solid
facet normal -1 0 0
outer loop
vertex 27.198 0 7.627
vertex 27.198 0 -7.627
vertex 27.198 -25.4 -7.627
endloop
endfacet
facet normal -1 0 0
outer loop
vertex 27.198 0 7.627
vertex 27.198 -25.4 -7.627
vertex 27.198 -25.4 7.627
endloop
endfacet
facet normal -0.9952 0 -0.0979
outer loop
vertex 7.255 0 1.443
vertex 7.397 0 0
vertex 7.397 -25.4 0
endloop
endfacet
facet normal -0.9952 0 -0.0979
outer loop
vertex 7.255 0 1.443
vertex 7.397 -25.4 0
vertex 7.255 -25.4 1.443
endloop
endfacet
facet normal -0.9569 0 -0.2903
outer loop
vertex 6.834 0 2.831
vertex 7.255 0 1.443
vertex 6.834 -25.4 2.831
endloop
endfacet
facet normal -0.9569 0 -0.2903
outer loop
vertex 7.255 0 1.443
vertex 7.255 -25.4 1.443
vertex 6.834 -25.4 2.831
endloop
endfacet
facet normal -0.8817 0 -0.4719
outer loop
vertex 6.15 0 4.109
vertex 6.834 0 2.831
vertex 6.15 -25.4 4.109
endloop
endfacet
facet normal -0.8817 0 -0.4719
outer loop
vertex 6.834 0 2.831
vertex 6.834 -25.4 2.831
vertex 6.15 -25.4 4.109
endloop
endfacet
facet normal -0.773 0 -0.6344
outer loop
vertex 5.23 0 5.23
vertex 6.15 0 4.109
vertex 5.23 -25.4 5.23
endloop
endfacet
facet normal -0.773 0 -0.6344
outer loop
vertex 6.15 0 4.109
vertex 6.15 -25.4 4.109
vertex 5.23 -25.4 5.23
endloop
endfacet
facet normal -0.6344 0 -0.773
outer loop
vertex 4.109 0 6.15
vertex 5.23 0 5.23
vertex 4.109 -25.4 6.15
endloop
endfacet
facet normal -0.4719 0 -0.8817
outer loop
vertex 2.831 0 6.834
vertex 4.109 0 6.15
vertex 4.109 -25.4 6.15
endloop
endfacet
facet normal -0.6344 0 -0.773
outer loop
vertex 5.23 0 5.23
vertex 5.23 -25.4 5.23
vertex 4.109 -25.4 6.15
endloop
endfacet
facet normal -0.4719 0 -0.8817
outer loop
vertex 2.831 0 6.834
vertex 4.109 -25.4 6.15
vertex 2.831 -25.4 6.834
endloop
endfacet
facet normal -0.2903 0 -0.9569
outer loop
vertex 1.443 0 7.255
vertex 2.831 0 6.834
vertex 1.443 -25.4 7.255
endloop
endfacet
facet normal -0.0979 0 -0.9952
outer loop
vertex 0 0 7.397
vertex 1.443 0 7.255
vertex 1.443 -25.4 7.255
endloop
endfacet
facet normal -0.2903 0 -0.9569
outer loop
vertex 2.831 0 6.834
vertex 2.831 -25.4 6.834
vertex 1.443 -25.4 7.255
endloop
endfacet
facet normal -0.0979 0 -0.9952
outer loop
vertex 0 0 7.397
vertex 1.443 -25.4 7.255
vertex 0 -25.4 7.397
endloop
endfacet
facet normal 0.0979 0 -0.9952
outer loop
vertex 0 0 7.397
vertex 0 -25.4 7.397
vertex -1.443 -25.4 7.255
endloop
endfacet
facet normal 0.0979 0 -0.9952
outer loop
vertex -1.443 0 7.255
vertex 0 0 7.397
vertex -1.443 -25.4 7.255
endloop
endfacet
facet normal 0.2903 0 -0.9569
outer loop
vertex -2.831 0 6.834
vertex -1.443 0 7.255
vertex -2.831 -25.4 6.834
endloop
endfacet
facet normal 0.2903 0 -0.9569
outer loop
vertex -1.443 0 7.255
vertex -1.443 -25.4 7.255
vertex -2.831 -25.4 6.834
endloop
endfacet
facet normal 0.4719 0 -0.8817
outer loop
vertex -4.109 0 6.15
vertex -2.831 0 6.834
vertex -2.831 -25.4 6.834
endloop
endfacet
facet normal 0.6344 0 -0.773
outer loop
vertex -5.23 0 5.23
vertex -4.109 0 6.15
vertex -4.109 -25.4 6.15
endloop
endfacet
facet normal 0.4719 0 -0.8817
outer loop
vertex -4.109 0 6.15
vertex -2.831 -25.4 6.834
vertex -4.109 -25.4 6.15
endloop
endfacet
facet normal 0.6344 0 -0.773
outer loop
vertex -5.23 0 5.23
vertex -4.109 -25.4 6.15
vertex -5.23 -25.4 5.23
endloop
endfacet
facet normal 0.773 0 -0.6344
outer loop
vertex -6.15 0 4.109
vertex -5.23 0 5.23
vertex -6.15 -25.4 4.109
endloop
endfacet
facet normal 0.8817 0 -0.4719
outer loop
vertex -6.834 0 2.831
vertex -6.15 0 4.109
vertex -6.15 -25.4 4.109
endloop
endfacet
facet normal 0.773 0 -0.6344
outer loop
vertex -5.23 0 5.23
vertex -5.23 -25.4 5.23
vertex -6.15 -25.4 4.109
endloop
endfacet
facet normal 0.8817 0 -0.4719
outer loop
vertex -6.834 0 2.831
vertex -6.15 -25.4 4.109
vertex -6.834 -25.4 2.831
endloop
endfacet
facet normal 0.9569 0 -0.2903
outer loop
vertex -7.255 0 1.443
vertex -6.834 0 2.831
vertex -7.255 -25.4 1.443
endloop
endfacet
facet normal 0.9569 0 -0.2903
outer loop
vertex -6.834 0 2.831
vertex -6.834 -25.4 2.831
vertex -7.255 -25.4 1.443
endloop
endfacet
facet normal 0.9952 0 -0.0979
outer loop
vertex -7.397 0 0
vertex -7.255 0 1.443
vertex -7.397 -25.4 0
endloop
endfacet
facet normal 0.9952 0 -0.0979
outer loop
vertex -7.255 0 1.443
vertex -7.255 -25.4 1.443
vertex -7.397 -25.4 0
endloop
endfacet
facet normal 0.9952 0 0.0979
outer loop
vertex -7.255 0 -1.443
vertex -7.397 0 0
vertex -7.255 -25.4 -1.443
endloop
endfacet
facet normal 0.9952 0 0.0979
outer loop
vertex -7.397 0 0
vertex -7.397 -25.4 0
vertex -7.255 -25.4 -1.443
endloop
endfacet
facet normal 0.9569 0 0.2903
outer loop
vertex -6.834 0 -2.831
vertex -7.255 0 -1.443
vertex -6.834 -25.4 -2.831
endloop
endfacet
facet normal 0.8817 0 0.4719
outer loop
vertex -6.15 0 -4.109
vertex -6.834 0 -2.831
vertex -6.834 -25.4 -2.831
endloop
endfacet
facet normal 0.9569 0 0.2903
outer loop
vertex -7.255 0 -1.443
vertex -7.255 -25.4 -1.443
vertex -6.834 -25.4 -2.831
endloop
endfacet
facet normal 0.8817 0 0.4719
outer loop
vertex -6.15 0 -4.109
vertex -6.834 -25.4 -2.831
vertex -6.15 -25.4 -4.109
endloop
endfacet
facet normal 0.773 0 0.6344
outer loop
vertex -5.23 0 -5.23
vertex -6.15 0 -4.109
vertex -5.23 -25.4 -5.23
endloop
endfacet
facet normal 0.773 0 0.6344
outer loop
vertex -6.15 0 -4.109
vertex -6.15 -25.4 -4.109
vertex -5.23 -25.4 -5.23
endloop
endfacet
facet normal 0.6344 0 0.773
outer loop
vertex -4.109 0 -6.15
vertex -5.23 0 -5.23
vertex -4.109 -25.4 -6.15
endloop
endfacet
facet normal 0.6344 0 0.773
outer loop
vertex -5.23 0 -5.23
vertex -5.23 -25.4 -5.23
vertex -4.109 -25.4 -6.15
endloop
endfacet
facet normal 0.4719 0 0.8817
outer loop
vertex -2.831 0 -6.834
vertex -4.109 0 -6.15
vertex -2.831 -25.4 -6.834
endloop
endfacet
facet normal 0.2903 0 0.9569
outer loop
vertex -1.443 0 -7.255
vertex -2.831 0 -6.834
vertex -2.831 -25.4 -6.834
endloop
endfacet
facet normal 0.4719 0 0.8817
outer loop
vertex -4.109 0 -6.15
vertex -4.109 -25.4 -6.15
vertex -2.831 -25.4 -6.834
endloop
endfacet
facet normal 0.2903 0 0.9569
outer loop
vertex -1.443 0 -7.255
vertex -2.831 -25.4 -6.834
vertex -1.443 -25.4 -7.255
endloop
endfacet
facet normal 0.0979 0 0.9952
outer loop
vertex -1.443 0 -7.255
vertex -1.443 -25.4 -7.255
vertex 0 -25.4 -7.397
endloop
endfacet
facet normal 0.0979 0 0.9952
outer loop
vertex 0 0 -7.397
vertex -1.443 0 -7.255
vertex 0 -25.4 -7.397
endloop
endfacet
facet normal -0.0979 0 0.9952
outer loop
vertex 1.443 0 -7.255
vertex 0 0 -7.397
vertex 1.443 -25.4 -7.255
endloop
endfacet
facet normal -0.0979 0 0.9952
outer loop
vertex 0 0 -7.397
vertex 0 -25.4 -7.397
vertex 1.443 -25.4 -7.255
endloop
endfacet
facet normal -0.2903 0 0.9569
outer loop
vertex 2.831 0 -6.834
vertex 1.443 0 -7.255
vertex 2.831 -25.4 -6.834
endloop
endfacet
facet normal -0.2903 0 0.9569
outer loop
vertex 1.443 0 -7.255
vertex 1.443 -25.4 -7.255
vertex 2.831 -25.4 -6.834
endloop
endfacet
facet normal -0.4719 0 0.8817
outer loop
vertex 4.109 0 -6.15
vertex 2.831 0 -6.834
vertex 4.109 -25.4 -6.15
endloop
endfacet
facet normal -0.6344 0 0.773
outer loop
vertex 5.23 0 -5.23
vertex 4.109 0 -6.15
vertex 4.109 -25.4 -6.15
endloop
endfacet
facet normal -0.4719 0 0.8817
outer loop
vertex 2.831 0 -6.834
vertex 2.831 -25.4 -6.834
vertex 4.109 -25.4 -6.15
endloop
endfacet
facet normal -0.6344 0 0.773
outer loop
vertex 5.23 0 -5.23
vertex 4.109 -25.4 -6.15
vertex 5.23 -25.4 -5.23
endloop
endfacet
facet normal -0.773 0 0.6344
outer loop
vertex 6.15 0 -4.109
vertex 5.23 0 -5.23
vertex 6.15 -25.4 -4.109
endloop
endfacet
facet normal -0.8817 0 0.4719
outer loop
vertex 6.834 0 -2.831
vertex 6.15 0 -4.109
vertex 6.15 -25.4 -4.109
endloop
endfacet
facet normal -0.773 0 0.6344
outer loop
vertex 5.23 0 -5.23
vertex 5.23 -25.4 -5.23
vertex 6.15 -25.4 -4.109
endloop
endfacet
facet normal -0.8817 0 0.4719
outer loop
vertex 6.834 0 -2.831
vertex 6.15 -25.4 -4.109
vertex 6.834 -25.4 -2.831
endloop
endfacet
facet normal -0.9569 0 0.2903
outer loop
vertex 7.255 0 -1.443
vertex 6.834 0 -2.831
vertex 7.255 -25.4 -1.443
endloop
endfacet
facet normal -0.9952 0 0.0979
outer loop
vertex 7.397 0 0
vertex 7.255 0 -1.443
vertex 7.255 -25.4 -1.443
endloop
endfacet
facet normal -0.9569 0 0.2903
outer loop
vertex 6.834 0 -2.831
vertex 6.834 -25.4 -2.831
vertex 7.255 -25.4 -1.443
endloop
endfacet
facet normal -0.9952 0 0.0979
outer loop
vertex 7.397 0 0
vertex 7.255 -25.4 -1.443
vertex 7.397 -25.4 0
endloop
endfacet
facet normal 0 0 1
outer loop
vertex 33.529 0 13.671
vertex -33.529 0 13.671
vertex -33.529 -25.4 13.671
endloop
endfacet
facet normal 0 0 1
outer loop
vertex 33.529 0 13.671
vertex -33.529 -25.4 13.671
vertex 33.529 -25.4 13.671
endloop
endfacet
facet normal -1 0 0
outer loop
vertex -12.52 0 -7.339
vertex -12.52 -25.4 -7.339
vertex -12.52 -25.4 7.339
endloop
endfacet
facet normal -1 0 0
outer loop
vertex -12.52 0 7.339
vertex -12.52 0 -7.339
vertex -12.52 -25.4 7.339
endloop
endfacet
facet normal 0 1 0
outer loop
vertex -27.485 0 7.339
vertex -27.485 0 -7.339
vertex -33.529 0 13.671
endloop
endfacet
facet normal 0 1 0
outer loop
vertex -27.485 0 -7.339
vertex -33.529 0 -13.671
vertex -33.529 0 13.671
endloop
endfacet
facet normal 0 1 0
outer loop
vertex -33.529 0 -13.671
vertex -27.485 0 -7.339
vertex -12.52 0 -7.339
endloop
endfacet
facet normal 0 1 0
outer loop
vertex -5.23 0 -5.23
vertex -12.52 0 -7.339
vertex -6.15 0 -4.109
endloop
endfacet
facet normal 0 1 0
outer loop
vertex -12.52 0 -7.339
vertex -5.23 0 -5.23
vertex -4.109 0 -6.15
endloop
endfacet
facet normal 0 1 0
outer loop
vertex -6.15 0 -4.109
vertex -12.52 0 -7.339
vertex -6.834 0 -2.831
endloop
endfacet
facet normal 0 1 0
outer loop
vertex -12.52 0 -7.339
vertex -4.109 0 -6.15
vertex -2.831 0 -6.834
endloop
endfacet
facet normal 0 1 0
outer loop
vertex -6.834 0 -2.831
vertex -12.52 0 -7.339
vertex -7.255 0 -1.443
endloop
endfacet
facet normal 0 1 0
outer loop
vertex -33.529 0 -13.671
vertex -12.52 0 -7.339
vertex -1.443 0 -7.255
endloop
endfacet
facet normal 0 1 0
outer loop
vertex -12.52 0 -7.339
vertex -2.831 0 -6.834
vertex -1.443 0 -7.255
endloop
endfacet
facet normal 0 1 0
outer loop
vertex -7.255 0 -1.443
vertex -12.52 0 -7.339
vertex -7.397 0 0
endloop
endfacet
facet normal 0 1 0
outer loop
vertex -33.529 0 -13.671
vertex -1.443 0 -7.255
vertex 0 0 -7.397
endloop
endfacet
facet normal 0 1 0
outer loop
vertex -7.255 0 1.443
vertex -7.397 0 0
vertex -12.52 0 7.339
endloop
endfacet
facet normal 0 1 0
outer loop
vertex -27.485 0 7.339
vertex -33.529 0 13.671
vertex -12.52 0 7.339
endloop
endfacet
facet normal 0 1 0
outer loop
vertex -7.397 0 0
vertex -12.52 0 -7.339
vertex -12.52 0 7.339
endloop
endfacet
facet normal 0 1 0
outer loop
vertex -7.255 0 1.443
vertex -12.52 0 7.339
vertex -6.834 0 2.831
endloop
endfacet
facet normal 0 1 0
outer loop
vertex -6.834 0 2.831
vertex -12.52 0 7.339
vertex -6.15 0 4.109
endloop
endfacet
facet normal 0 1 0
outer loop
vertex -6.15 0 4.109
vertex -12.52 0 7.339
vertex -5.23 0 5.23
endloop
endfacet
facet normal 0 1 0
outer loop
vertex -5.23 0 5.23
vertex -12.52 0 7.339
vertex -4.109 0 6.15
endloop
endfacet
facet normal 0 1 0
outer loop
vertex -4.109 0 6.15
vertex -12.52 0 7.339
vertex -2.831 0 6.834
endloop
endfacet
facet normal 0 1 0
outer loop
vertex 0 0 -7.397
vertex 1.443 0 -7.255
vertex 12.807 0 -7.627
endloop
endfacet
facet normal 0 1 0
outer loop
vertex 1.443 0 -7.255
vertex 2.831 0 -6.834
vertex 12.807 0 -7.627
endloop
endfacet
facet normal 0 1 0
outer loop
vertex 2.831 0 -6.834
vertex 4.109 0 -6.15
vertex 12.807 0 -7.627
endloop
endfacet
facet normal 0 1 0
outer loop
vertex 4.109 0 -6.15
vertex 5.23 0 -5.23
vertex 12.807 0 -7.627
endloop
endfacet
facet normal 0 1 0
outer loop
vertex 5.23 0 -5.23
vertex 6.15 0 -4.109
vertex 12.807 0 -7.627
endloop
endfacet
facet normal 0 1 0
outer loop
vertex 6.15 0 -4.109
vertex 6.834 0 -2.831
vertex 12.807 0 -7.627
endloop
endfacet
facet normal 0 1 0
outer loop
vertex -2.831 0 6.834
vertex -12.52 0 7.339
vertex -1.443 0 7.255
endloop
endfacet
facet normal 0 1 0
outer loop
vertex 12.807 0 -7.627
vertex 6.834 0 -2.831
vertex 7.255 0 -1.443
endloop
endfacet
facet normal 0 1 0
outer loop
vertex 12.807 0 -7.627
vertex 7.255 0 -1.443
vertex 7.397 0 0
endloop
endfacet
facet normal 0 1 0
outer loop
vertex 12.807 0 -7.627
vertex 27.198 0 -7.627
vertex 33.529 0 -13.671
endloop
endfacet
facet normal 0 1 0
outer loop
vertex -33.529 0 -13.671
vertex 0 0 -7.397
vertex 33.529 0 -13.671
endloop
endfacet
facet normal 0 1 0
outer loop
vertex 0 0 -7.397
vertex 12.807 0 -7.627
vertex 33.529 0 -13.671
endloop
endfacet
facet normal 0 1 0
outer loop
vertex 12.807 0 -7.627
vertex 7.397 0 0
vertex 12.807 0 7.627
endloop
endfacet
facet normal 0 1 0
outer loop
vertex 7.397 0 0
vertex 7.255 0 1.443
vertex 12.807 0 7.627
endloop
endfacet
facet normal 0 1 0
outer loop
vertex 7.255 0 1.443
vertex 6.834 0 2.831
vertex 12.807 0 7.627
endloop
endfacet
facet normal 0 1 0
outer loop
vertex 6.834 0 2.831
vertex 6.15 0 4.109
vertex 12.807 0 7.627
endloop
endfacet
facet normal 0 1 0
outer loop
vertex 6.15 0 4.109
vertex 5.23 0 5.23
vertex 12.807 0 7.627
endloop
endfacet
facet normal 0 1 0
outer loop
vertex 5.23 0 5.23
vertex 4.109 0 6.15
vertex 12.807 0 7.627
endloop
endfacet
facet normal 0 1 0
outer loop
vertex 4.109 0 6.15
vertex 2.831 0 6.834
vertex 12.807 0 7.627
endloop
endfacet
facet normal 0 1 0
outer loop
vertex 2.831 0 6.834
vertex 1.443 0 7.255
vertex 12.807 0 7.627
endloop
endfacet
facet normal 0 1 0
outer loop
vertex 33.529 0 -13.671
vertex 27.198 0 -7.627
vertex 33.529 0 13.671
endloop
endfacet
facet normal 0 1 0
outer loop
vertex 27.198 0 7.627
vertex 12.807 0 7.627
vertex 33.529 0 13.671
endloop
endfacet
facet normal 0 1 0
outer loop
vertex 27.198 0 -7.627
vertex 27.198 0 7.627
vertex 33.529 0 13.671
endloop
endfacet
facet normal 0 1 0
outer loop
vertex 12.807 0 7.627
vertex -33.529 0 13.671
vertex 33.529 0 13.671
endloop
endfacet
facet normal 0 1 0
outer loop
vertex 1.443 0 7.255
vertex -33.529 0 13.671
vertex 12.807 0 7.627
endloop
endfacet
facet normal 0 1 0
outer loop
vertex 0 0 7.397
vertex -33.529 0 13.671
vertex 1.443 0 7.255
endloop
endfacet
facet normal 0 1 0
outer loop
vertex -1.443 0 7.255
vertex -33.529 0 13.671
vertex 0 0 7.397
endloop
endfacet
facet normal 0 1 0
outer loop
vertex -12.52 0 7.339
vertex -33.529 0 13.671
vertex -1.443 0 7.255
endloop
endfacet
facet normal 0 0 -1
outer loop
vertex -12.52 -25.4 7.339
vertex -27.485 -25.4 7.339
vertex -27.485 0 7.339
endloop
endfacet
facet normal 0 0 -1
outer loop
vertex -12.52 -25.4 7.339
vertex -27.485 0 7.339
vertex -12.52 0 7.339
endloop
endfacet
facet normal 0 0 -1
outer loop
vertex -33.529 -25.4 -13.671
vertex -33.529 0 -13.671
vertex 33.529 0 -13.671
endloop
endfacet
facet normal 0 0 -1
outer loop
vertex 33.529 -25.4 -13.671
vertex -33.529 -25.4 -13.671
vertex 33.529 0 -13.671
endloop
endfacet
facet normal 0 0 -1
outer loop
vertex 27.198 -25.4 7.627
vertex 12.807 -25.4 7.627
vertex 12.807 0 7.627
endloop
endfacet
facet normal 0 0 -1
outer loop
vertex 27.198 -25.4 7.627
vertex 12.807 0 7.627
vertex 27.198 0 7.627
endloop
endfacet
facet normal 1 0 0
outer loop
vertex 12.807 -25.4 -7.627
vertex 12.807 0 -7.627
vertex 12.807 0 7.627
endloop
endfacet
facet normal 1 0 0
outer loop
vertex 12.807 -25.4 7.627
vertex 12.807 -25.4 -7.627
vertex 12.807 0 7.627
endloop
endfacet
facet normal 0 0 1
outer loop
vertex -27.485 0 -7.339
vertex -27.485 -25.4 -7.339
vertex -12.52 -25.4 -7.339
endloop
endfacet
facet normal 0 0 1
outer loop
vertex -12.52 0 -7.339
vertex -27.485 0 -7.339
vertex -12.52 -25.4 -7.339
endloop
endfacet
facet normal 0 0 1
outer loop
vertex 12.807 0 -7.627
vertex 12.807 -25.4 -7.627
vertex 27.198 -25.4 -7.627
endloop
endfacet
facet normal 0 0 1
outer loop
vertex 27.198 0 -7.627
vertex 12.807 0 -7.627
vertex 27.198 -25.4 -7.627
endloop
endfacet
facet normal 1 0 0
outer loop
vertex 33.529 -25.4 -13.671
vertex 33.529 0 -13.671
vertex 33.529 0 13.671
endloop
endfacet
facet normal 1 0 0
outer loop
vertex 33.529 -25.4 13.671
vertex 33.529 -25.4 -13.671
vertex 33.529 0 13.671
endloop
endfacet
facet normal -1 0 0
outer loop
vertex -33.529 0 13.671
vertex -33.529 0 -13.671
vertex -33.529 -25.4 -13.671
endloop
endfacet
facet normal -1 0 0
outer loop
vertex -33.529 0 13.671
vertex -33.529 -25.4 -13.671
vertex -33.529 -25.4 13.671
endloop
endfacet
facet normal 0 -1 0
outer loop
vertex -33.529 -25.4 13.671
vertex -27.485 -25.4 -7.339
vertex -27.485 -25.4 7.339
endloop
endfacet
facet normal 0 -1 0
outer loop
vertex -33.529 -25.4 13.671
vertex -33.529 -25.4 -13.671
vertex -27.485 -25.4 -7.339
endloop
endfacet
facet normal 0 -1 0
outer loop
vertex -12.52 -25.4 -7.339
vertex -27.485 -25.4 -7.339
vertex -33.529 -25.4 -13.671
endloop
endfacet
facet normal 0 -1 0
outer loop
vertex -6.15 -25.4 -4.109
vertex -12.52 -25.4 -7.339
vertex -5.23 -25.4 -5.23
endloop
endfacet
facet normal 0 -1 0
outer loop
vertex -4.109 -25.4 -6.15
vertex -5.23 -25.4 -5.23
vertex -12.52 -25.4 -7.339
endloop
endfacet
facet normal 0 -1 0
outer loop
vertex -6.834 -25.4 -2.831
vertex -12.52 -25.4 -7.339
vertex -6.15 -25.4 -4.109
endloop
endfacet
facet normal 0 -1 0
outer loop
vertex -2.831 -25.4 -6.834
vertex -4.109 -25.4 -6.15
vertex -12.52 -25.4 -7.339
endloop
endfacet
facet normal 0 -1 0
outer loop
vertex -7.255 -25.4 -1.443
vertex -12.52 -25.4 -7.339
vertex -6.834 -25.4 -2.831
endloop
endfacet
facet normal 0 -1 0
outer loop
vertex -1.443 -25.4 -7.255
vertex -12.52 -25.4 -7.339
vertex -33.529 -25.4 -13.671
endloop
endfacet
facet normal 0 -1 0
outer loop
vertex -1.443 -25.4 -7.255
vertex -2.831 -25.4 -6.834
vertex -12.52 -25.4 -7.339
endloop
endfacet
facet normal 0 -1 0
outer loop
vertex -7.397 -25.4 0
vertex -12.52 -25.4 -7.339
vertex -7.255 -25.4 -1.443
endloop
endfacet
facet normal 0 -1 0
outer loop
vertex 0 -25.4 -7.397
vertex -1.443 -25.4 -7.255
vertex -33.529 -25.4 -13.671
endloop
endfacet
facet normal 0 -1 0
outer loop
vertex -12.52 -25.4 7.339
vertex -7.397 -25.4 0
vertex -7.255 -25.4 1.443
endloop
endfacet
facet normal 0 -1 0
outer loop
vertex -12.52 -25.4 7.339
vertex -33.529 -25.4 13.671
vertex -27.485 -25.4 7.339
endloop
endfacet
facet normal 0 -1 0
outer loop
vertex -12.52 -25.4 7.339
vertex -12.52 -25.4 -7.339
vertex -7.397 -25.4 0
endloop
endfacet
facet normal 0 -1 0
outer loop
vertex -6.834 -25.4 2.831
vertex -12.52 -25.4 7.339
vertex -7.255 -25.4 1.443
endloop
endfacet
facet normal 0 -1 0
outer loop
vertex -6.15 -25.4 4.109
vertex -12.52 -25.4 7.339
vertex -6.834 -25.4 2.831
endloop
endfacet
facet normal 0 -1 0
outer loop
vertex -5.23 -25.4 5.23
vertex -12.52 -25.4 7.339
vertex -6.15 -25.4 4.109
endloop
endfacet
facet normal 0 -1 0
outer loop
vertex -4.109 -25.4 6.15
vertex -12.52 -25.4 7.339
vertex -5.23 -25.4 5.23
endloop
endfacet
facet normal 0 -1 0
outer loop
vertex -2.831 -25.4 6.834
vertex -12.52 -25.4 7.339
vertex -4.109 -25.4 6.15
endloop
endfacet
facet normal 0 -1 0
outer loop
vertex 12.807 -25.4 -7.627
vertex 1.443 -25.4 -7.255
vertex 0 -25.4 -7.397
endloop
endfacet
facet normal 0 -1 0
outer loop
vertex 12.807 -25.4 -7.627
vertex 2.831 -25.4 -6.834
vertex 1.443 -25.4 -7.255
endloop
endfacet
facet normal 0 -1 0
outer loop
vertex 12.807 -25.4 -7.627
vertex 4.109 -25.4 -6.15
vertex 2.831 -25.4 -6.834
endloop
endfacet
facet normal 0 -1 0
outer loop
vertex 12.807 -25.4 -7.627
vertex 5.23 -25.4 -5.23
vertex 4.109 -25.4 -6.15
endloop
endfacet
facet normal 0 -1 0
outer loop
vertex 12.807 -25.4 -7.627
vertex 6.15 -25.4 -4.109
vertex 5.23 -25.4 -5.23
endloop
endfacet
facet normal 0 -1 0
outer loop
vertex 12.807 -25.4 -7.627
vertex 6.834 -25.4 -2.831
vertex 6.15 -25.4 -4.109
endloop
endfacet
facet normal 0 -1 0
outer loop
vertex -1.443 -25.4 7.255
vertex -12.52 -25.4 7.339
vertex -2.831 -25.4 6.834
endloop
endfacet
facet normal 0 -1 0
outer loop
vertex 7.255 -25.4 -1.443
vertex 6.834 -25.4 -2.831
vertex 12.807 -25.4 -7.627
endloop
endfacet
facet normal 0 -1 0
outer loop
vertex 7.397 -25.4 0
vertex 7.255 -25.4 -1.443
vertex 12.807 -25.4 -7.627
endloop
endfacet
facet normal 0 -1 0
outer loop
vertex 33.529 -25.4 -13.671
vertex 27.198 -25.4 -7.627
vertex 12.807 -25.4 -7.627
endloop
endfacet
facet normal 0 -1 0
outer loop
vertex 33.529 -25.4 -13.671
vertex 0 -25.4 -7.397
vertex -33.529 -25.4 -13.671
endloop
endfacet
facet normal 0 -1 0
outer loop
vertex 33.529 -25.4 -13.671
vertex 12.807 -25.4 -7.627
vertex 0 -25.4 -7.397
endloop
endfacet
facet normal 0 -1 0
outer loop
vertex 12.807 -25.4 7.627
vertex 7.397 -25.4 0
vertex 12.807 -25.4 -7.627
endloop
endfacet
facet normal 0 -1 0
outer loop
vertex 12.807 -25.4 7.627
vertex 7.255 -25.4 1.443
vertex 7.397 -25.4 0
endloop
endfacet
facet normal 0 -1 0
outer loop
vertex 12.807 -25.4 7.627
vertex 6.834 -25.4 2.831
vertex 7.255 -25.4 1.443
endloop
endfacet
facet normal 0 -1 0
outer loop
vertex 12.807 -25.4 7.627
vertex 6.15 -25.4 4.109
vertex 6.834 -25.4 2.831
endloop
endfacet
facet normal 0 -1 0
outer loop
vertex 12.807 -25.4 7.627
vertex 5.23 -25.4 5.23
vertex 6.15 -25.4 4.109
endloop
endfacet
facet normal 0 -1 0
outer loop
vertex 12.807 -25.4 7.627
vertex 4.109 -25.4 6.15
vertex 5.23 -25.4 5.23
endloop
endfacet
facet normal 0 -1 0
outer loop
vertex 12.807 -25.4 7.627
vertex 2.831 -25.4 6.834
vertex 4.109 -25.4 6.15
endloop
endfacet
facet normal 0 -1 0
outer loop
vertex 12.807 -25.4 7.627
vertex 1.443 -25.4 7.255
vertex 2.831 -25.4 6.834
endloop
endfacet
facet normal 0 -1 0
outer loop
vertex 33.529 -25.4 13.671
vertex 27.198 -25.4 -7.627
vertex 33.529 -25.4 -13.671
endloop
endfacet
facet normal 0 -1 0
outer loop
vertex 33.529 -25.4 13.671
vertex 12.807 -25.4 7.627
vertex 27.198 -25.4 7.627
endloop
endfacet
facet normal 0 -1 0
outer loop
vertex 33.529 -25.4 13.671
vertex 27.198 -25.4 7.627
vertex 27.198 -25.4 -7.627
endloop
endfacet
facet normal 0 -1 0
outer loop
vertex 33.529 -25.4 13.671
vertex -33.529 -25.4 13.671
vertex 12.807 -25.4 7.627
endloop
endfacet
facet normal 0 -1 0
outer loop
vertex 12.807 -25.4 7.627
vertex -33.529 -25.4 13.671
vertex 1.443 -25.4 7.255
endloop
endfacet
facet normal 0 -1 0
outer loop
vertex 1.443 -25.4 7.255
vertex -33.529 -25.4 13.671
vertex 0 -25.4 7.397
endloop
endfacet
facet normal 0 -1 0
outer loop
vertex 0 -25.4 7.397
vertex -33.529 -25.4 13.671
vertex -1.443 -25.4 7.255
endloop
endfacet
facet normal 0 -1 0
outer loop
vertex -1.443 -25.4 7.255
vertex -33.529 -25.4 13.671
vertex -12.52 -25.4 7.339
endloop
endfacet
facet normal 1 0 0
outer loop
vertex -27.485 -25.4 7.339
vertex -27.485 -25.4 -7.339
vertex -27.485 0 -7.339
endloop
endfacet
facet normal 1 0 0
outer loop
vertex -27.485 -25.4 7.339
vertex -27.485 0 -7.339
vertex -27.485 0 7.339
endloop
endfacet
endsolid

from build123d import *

# Parameters (mm, degrees)
F0_W     = 67.058742
F0_H     = 27.341548
F1_DEPTH = 25.4
F2_W     = 14.965903
F2_H     = 14.678094
F3_DEPTH = 25.4
F4_R     = 7.396664
F5_DEPTH = 25.4
F6_W     = 14.390292
F6_H     = 15.253704
F7_DEPTH = 25.4


with BuildPart() as f1:
    # F0 (on Front) → F1 (new body)
    with BuildSketch(Plane.XZ):
        Rectangle(F0_W, F0_H)
    extrude(amount=F1_DEPTH)

    # F2 (on face) → F3 (cut)
    with BuildSketch(Plane.XZ.offset(25.4)):
        with Locations((-20.002499, 0)):
            Rectangle(F2_W, F2_H)
    extrude(amount=-F3_DEPTH, mode=Mode.SUBTRACT)

    # F4 (on face) → F5 (cut)
    with BuildSketch(Plane.XZ.offset(25.4)):
        Circle(F4_R)
    extrude(amount=-F5_DEPTH, mode=Mode.SUBTRACT)

    # F6 (on face) → F7 (cut)
    with BuildSketch(Plane.XZ.offset(25.4)):
        with Locations((20.002501, 0)):
            Rectangle(F6_W, F6_H)
    extrude(amount=-F7_DEPTH, mode=Mode.SUBTRACT)


solid = f1.part
